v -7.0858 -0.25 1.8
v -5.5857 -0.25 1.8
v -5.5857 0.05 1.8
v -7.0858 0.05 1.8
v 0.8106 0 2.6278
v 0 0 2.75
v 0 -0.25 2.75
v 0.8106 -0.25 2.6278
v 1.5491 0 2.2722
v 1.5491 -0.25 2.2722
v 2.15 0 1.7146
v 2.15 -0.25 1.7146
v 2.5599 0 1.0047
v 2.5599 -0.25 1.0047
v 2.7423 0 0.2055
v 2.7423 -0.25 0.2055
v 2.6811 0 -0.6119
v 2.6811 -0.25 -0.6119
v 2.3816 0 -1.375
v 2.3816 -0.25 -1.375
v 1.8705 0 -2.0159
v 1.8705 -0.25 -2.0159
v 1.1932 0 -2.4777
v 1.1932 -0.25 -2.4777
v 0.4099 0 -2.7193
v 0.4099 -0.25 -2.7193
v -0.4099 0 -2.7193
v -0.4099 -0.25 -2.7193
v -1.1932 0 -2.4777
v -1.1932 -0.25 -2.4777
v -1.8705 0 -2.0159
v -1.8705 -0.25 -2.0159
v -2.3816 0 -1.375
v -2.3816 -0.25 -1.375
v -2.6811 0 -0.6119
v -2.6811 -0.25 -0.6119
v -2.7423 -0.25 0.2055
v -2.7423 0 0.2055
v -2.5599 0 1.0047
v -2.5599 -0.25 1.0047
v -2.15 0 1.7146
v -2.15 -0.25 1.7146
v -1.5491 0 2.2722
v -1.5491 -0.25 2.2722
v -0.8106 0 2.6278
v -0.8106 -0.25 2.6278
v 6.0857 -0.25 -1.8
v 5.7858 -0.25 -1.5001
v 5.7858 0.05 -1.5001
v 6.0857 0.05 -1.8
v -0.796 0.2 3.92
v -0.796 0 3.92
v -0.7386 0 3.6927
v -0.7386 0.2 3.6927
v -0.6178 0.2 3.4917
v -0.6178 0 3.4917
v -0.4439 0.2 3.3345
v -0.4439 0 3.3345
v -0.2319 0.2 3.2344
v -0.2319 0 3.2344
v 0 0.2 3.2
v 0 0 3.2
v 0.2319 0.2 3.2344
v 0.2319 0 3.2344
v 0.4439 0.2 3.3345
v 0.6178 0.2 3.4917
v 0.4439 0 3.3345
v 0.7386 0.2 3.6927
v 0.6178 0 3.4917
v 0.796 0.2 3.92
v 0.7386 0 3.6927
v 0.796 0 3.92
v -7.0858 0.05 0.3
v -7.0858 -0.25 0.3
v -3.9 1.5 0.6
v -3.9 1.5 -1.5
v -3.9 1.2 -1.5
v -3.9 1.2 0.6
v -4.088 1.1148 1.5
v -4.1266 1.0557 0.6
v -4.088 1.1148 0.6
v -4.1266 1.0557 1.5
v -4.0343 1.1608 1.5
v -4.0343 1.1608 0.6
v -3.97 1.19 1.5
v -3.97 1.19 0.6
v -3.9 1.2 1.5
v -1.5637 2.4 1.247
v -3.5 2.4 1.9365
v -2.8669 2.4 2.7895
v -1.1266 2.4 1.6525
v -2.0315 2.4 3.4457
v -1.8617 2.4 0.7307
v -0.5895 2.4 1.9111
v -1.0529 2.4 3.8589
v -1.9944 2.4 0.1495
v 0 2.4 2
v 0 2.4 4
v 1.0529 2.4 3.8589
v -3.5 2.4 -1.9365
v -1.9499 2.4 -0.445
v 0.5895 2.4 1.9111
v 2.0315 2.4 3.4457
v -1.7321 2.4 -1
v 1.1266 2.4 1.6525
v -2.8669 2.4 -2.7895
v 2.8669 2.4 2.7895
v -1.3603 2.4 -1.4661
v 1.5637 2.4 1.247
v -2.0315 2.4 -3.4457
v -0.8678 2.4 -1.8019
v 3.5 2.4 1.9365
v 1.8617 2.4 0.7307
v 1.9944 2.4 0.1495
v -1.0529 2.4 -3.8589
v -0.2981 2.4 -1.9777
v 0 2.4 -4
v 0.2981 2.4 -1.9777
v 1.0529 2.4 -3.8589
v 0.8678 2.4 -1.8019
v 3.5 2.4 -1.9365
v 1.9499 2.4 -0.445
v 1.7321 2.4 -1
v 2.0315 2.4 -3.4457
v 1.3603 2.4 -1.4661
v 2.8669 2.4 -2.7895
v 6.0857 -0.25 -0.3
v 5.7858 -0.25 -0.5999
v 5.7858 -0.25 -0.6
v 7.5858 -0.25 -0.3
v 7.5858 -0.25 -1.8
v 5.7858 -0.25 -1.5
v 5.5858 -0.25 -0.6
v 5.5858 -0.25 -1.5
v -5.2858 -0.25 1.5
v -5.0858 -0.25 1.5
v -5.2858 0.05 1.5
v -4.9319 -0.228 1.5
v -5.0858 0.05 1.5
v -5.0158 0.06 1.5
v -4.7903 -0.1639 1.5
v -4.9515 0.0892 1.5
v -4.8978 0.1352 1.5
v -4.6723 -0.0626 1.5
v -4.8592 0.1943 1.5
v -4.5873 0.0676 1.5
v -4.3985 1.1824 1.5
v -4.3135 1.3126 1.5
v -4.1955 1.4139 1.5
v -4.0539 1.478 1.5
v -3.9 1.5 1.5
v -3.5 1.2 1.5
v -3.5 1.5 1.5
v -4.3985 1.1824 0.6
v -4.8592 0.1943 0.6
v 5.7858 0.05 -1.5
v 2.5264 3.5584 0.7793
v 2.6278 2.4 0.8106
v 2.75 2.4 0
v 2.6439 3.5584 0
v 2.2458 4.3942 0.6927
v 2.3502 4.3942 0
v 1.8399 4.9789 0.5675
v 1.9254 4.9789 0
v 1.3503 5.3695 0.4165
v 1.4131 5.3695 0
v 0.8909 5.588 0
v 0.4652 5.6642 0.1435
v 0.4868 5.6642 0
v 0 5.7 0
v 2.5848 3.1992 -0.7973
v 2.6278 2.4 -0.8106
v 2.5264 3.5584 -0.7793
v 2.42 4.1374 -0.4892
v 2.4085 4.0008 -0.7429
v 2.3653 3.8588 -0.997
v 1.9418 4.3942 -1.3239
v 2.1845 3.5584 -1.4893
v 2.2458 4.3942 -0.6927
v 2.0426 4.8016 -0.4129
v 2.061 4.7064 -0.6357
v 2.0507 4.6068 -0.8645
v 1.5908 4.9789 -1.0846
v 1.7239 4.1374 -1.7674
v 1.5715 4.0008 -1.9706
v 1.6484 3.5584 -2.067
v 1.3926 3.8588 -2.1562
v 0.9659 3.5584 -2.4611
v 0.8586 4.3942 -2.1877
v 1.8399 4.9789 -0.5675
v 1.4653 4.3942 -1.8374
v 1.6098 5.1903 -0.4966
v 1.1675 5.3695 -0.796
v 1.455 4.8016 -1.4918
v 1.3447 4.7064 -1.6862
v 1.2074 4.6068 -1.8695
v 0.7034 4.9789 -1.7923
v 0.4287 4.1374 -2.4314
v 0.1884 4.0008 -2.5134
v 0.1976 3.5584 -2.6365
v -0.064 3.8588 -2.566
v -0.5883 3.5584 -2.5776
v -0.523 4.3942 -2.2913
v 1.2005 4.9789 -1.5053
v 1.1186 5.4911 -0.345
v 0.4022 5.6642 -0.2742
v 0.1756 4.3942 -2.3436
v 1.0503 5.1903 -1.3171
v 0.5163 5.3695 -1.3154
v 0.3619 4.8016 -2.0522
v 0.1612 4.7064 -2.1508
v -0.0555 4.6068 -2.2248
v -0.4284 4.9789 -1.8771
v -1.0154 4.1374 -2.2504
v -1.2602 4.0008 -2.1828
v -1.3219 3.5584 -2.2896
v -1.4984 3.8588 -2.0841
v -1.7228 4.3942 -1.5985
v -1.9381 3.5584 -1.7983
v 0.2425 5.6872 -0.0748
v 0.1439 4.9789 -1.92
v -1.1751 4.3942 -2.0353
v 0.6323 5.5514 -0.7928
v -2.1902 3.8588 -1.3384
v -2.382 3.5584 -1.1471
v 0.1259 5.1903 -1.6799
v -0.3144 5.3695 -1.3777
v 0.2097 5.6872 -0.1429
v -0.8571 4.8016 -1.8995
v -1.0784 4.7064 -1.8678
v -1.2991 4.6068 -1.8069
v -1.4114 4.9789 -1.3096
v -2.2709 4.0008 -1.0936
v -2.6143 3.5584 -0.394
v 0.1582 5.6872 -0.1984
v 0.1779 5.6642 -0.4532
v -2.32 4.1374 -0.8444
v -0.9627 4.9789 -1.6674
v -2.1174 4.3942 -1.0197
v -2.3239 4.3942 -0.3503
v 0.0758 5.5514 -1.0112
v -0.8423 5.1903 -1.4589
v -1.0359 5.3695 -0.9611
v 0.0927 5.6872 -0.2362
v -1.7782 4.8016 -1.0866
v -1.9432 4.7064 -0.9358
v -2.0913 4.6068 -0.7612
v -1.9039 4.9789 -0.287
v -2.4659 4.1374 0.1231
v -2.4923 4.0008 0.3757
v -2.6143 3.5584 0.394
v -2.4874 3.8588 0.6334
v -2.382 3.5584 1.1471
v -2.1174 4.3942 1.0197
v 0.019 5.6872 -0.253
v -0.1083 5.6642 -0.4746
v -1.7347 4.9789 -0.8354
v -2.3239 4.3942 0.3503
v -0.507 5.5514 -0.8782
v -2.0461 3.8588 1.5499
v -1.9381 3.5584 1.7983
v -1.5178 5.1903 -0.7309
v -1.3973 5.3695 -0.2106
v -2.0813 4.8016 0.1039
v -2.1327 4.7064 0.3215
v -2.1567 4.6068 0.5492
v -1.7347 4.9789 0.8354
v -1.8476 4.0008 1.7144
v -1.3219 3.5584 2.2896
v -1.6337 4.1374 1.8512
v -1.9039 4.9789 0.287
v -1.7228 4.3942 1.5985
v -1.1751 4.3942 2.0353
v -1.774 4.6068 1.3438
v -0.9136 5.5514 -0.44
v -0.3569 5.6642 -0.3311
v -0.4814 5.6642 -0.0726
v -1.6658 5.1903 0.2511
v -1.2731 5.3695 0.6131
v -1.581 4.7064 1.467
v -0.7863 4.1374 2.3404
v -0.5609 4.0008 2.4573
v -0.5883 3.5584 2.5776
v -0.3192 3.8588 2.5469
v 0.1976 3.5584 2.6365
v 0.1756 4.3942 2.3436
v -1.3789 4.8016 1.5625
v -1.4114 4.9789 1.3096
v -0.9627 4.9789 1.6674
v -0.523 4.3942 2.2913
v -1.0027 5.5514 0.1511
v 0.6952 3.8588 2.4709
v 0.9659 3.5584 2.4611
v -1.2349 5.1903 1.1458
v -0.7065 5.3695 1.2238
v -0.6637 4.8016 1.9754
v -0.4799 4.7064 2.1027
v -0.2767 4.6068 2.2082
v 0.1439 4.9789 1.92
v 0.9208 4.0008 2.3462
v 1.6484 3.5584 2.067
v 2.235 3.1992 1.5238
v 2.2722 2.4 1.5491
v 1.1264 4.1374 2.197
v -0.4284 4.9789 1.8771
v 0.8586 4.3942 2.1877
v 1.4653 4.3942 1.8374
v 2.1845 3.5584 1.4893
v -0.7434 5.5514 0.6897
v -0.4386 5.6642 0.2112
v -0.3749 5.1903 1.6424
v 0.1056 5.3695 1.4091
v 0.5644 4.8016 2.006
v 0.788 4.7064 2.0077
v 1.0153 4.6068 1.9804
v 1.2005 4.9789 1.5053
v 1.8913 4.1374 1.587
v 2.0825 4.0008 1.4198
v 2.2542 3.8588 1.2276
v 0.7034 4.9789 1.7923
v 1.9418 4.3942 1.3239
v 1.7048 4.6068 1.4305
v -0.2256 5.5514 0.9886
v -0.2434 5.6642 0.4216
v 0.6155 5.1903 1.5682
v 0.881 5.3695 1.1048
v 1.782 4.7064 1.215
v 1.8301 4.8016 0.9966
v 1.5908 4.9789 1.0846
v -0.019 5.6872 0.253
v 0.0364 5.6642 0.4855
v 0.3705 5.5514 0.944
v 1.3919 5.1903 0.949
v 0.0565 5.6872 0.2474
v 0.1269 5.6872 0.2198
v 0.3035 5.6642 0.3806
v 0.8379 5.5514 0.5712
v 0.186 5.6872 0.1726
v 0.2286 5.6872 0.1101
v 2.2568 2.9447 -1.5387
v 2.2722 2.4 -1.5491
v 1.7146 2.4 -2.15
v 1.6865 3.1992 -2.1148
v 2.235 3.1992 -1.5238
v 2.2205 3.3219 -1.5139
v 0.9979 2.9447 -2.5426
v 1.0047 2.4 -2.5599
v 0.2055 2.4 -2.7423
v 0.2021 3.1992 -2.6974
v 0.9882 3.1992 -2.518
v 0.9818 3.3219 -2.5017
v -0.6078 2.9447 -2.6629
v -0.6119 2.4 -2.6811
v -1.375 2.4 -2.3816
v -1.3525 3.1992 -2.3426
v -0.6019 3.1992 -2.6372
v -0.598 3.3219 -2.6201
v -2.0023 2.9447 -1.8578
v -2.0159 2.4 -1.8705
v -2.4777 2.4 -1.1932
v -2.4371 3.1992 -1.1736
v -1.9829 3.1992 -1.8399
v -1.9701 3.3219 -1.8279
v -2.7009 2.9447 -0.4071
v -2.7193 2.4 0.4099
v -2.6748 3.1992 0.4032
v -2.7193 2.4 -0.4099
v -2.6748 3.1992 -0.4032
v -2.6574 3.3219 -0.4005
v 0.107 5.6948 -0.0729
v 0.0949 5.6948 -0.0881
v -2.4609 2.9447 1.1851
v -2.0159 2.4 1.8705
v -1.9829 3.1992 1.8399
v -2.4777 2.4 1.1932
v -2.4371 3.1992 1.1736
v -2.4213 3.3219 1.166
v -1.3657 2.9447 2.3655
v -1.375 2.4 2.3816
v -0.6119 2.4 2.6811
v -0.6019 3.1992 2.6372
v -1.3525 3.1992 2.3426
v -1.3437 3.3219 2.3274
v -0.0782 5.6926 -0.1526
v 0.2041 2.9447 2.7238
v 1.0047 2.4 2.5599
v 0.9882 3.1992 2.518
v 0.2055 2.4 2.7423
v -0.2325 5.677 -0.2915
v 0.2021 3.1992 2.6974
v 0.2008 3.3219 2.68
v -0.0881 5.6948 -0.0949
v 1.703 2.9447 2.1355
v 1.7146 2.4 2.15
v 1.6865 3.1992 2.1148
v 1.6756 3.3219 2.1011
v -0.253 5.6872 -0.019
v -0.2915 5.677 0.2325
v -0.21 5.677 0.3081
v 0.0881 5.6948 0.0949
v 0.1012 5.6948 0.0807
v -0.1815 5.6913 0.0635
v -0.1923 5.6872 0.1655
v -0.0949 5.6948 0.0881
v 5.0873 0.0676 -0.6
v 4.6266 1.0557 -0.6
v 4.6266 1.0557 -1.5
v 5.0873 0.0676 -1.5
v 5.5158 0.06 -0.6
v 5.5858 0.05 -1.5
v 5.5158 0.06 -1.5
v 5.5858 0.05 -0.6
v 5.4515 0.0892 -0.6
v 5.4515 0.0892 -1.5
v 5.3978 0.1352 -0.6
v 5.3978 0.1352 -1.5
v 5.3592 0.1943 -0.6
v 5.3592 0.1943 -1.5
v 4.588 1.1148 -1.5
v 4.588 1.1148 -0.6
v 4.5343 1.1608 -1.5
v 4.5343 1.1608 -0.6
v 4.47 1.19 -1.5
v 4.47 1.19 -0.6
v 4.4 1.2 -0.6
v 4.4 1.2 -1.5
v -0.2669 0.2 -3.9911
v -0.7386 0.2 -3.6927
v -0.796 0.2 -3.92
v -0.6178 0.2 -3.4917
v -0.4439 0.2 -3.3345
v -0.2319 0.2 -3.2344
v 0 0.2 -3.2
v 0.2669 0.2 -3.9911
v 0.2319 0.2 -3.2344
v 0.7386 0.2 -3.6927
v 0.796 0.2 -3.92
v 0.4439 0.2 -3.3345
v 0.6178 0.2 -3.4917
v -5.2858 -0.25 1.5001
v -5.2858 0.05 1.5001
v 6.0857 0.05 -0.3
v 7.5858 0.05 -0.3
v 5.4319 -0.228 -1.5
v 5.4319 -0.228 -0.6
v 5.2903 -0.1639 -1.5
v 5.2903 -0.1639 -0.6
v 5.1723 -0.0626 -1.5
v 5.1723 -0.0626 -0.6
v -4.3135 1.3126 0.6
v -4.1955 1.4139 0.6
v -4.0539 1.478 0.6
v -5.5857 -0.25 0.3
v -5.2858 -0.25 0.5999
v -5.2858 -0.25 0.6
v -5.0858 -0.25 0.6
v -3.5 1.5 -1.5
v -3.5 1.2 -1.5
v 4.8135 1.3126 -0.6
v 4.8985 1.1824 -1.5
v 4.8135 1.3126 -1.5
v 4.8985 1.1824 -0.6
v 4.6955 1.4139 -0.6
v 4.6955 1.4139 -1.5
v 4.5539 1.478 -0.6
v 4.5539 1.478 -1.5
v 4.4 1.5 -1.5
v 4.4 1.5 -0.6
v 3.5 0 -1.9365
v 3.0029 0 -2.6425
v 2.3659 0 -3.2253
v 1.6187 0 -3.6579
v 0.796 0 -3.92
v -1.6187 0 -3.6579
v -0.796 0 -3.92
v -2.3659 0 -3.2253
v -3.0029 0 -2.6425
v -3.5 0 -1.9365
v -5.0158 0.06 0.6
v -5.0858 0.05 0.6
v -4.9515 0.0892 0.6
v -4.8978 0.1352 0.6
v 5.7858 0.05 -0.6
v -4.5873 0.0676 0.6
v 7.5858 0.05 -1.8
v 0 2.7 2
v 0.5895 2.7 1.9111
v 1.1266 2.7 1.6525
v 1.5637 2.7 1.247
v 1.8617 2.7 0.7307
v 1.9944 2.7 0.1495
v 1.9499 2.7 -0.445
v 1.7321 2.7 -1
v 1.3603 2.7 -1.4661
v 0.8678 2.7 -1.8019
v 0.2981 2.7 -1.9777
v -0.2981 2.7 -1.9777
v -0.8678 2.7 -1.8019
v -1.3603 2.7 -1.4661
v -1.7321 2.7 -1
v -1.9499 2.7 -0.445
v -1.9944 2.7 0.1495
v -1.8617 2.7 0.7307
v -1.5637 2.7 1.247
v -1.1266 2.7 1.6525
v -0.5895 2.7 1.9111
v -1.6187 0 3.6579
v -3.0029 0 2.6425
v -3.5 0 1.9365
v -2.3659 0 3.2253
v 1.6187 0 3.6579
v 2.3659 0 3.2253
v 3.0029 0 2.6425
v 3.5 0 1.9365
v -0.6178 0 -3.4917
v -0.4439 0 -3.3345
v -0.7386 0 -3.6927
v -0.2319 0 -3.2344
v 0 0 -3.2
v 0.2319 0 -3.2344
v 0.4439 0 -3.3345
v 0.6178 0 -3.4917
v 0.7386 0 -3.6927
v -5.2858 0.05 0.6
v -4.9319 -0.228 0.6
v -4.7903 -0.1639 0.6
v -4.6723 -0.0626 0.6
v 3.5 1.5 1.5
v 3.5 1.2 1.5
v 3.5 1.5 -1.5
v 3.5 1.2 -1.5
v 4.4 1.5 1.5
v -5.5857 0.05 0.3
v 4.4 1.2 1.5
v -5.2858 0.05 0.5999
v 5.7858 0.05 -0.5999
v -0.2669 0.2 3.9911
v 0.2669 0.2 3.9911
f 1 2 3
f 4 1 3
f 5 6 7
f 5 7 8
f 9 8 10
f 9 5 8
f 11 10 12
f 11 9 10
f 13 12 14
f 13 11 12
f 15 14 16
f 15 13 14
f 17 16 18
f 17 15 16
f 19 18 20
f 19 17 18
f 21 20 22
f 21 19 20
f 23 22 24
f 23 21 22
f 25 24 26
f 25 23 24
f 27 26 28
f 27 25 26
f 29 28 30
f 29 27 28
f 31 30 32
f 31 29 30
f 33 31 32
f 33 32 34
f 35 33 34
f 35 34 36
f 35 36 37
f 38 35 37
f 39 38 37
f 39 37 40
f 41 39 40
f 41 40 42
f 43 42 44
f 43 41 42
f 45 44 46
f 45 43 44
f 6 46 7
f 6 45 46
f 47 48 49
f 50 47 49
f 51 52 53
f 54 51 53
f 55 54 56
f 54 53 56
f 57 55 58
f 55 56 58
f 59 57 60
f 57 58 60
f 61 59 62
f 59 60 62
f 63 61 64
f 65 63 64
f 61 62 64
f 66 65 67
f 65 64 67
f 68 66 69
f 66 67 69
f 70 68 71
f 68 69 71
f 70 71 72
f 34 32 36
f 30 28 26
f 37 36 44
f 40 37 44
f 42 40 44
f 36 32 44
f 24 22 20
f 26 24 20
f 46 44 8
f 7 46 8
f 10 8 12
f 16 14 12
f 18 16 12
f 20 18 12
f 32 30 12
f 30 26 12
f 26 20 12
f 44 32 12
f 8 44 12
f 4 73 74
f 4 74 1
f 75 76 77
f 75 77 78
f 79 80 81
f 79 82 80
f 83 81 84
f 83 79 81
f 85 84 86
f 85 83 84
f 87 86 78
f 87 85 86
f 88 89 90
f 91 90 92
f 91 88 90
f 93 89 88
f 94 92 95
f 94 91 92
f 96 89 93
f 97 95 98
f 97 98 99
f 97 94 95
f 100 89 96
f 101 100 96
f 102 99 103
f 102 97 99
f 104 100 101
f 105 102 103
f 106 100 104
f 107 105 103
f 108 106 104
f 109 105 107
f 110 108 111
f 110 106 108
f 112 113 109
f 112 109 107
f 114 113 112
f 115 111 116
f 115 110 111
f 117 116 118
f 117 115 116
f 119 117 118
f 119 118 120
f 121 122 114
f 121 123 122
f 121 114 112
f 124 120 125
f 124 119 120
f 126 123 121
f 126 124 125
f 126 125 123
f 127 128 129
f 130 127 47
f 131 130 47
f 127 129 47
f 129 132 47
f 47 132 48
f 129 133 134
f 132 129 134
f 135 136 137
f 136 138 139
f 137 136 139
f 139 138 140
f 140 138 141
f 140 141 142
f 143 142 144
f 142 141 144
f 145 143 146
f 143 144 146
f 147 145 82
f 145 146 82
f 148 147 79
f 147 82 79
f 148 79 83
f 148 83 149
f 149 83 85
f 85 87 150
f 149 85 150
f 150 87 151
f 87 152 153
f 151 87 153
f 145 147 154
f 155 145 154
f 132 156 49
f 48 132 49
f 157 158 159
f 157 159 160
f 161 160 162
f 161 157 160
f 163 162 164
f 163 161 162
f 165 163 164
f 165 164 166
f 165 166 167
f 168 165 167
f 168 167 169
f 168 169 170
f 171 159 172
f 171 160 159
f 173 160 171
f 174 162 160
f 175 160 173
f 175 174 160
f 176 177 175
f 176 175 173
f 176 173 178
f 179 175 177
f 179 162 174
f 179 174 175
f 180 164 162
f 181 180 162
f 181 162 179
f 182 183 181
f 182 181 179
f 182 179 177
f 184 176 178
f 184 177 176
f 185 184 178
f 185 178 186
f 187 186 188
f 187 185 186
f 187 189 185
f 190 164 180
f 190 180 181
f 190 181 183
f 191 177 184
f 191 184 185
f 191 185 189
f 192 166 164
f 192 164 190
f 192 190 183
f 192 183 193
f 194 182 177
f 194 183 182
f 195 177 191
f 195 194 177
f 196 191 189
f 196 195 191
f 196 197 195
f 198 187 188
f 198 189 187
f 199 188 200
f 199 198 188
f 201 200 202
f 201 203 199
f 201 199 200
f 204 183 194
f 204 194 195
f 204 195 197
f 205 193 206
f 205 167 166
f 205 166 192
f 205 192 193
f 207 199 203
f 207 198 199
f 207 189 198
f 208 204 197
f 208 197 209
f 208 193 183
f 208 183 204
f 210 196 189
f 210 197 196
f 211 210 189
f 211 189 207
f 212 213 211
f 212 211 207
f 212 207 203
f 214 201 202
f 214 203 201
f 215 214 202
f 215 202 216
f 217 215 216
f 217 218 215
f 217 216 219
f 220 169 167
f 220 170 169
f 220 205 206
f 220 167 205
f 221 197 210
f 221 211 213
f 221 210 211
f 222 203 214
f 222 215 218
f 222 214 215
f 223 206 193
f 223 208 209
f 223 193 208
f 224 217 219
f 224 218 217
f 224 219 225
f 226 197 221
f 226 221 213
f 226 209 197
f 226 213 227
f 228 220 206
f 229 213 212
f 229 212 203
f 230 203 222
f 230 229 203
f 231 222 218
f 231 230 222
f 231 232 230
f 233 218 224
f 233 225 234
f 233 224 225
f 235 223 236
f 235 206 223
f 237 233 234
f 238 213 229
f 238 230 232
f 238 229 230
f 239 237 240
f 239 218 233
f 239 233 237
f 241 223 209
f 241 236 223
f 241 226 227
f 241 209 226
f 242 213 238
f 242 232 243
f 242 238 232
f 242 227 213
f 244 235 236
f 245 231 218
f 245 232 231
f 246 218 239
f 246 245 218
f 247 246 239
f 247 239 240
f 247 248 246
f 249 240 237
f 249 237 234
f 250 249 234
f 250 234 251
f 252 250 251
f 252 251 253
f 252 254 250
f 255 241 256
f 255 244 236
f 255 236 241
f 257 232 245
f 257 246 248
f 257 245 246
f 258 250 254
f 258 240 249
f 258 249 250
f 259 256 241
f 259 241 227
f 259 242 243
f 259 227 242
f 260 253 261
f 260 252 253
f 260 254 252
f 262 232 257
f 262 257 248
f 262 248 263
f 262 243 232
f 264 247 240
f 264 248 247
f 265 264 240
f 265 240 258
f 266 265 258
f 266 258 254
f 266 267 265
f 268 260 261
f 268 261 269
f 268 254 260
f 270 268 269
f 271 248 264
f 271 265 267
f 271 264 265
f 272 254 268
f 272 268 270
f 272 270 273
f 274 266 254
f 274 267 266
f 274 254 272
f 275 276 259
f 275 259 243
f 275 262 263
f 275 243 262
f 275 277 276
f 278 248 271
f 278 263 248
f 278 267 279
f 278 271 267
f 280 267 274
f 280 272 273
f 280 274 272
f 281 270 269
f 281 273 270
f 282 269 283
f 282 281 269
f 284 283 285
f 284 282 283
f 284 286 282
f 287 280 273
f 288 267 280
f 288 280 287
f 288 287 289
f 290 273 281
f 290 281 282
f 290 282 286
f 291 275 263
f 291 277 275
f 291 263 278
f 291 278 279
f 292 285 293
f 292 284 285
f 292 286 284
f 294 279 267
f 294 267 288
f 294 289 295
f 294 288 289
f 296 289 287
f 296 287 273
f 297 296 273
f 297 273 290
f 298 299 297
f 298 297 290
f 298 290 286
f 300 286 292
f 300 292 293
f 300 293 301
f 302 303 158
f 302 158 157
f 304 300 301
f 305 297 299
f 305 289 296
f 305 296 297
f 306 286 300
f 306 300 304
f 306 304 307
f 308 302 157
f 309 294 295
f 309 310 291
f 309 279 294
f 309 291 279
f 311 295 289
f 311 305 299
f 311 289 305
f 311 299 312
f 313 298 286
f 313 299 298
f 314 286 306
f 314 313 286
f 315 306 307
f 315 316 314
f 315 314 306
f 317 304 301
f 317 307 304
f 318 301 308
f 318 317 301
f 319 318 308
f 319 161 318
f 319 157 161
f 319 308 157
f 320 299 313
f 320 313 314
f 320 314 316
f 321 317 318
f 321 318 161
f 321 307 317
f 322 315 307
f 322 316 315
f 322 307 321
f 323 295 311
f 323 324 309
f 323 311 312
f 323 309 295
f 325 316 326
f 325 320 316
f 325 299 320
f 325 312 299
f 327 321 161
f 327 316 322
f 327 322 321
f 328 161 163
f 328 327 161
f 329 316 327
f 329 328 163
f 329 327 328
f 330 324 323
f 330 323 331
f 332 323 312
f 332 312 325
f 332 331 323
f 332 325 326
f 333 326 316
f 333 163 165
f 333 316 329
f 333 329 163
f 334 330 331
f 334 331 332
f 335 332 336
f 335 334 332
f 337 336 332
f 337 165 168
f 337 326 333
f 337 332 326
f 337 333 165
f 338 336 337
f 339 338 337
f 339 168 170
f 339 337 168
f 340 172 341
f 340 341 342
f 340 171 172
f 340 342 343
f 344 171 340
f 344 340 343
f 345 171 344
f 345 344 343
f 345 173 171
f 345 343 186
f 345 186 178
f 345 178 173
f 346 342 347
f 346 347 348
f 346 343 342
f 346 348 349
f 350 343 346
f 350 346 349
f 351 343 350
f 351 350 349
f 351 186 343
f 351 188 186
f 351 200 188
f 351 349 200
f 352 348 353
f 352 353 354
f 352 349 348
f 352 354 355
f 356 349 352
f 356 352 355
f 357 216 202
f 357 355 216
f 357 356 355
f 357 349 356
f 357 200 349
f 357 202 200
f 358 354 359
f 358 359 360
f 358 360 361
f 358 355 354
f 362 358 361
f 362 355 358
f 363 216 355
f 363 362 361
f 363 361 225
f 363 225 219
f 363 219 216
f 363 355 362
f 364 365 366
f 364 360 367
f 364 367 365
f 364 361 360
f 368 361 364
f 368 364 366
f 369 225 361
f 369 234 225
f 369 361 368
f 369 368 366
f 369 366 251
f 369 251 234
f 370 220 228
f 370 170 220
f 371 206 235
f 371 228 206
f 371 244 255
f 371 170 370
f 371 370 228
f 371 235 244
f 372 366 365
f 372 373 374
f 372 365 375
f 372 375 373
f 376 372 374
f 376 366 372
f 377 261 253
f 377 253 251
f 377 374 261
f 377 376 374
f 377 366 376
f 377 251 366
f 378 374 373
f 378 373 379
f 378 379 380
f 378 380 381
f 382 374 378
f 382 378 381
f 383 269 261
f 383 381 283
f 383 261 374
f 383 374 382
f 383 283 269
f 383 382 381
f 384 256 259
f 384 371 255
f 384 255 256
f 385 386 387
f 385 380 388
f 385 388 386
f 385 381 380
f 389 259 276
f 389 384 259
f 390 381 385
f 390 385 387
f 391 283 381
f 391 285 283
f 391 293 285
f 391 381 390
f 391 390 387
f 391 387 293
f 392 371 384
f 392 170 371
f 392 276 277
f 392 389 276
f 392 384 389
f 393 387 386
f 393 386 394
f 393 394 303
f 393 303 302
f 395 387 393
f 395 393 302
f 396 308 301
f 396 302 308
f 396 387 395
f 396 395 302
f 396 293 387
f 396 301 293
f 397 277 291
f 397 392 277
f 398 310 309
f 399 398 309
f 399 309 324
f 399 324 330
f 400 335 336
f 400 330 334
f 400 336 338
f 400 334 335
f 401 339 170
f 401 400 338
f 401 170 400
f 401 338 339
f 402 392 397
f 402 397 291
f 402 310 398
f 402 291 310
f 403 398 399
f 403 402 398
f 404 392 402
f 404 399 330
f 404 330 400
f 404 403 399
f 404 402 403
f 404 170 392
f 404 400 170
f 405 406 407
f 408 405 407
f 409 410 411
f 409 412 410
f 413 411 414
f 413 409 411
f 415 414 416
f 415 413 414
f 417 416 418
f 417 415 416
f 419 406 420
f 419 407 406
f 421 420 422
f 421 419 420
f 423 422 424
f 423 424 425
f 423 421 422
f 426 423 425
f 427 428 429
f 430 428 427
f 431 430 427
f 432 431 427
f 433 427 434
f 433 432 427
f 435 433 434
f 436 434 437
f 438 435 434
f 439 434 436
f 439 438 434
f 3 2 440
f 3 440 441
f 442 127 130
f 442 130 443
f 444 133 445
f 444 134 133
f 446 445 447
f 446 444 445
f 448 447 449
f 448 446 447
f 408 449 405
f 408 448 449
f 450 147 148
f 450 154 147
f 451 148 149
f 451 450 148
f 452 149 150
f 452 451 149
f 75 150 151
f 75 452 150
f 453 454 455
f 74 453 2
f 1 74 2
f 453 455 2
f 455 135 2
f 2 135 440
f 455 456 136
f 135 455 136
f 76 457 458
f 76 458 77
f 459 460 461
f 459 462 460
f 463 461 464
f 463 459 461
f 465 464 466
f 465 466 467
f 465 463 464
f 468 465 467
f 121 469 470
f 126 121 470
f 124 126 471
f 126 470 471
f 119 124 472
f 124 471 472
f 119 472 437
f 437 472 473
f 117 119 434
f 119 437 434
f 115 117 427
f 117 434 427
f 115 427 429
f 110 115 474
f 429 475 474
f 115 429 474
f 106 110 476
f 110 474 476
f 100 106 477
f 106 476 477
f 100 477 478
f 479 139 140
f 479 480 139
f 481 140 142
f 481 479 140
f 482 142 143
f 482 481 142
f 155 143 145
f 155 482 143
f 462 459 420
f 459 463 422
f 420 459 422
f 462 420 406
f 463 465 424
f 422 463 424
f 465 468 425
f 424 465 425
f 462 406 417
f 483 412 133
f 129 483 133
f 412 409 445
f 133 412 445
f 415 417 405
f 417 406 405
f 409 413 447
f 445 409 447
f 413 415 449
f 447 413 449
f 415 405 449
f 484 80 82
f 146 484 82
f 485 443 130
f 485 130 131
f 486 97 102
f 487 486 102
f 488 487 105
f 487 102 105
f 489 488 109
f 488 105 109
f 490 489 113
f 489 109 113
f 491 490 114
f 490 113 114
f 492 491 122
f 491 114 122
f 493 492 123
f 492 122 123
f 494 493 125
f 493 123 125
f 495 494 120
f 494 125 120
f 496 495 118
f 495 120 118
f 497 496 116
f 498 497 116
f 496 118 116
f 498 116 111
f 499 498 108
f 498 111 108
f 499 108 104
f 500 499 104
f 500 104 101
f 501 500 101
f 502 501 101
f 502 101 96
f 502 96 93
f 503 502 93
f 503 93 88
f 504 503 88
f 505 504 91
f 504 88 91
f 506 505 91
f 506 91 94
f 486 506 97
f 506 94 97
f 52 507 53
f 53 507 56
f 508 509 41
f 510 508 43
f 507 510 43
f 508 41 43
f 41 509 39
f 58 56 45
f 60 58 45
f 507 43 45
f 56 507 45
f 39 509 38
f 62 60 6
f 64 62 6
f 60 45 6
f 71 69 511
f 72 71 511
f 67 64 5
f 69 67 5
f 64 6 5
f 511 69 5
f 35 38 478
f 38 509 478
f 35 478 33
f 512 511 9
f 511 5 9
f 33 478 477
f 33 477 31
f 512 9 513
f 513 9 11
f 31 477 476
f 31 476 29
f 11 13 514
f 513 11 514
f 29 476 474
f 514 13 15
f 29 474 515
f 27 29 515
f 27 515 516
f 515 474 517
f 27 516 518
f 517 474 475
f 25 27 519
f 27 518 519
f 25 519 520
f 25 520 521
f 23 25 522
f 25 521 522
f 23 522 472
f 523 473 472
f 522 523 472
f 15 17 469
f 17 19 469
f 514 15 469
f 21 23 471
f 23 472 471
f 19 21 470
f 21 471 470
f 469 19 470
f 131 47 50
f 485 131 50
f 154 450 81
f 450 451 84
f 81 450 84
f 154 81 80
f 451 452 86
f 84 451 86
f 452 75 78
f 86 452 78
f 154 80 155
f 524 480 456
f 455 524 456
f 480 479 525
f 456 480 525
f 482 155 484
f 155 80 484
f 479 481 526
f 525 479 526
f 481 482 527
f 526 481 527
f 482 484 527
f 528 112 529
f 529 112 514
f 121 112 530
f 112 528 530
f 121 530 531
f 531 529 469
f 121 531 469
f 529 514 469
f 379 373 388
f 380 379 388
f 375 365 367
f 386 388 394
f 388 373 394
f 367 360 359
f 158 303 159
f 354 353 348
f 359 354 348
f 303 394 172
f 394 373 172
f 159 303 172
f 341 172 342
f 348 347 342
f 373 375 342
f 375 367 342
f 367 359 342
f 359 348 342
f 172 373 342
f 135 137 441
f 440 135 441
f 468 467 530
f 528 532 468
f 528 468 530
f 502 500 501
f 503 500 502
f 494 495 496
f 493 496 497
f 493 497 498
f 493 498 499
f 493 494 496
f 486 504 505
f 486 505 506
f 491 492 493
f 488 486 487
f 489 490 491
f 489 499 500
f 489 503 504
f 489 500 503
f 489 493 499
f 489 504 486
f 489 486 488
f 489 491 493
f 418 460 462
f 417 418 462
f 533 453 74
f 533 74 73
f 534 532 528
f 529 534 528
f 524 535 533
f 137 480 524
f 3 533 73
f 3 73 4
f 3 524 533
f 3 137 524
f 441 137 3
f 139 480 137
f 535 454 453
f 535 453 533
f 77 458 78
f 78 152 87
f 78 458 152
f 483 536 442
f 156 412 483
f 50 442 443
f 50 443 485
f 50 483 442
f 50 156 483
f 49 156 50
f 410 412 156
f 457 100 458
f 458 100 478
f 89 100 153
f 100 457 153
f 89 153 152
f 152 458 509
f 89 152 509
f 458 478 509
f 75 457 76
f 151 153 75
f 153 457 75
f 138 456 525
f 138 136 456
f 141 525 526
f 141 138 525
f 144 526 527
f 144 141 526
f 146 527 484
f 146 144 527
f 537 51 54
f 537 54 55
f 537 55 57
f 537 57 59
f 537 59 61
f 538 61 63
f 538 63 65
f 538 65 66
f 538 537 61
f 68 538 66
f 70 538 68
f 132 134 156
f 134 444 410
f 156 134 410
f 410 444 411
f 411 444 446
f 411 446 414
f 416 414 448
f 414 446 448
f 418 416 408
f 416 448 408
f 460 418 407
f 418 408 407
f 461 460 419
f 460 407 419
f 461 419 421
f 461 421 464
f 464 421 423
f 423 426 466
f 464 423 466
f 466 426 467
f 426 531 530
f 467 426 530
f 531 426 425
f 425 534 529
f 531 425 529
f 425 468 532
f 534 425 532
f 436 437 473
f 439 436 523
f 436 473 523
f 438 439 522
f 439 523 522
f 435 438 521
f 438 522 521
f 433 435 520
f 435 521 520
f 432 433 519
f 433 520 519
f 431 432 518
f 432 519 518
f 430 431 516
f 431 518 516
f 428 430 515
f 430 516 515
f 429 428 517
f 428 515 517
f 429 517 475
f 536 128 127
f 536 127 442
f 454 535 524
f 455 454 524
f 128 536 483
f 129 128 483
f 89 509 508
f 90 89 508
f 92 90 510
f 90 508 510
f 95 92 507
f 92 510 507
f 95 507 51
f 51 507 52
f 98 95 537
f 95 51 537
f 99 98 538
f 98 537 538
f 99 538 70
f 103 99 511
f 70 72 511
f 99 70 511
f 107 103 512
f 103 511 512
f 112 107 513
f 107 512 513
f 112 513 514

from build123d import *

# Parameters (mm, degrees)
BOSS_EXTRUDE1_DEPTH = 2.4
SKETCH2_R           = 2.75
BOSS_EXTRUDE2_DEPTH = 0.25
SKETCH3_R           = 2
BOSS_EXTRUDE3_DEPTH = 0.3
SKETCH5_W           = 8.3
SKETCH5_H           = 3
BOSS_EXTRUDE4_DEPTH = 0.15
SKETCH6_W           = 0.9
SKETCH6_H           = 0.3
SKETCH8_W           = 0.9
SKETCH8_H           = 0.3
SKETCH10_W          = 1.5
SKETCH10_H          = 0.3
BOSS_EXTRUDE5_DEPTH = 1.8
SKETCH11_W          = 1.5
SKETCH11_H          = 0.3
BOSS_EXTRUDE6_DEPTH = 1.8
CHAMFER1_SIZE       = 0.3
SKETCH12_R          = 0.8
CUT_EXTRUDE1_DEPTH  = 0.2


with BuildPart() as part:
    # Sketch1 → Boss-Extrude1 (new body)
    with BuildSketch(Plane(origin=(0, 0, 0), x_dir=(1, 0, 0), z_dir=(0, 1, 0))):
        with BuildLine():
            Line((-3.5, 1.936491673), (-3.5, -1.936491673))
            ThreePointArc((-3.5, -1.936491673), (0, -4), (3.5, -1.936491673))
            Line((3.5, -1.936491673), (3.5, 1.936491673))
            ThreePointArc((3.5, 1.936491673), (0, 4), (-3.5, 1.936491673))
        make_face()
    extrude(amount=BOSS_EXTRUDE1_DEPTH)

    # Sketch2 → Boss-Extrude2 (add)
    with BuildSketch(Plane(origin=(0, 0, 0), x_dir=(1, 0, 0), z_dir=(0, 1, 0))):
        with Locations(Location((0, 0, 0), (0, 0, 270))):
            Circle(SKETCH2_R)
    extrude(amount=-BOSS_EXTRUDE2_DEPTH)

    # Sketch3 → Boss-Extrude3 (add)
    with BuildSketch(Plane(origin=(0, 2.4, 0), x_dir=(1, 0, 0), z_dir=(0, 1, 0))):
        with Locations(Location((0, 0, 0), (0, 0, 270))):
            Circle(SKETCH3_R)
    extrude(amount=BOSS_EXTRUDE3_DEPTH)

    # Sketch5 → Boss-Extrude4 (add, symmetric)
    with BuildSketch(Plane(origin=(0, 1.35, 0), x_dir=(-1, 0, 0), z_dir=(0, 1, 0))):
        with Locations((-0.25, 0)):
            Rectangle(SKETCH5_W, SKETCH5_H)
    extrude(amount=BOSS_EXTRUDE4_DEPTH, both=True)

    # Sweep2: sweep along a path in Sketch7
    with BuildLine(Plane.XY.offset(-1.05)) as sweep2_path:
        Line((5.785802313, -0.1), (5.585802313, -0.1))
        ThreePointArc((5.585802313, -0.1), (5.37088247, -0.037356578), (5.223279198, 0.130952695))
        Line((5.223279198, 0.130952695), (4.762523115, 1.119047305))
        ThreePointArc((4.762523115, 1.119047305), (4.614919843, 1.287356578), (4.4, 1.35))
    # Sketch6 → Sweep2 (sweep)
    with BuildSketch(Plane(origin=(4.4, 0, 0), x_dir=(0, 0, -1), z_dir=(1, 0, 0))):
        with Locations((1.05, 1.35)):
            Rectangle(SKETCH6_W, SKETCH6_H)
    sweep(path=sweep2_path.line)

    # Sweep3: sweep along a path in Sketch9
    with BuildLine(Plane.XY.offset(1.05)) as sweep3_path:
        Line((-5.285802313, -0.1), (-5.085802313, -0.1))
        ThreePointArc((-5.085802313, -0.1), (-4.87088247, -0.037356578), (-4.723279198, 0.130952695))
        Line((-4.723279198, 0.130952695), (-4.262523115, 1.119047305))
        ThreePointArc((-4.262523115, 1.119047305), (-4.114919843, 1.287356578), (-3.9, 1.35))
    # Sketch8 → Sweep3 (sweep)
    with BuildSketch(Plane.ZY.offset(3.9)):
        with Locations((1.05, 1.35)):
            Rectangle(SKETCH8_W, SKETCH8_H)
    sweep(path=sweep3_path.line)

    # Sketch10 → Boss-Extrude5 (add)
    with BuildSketch(Plane.ZY.offset(5.285802313)):
        with Locations((1.05, -0.1)):
            Rectangle(SKETCH10_W, SKETCH10_H)
    extrude(amount=BOSS_EXTRUDE5_DEPTH)

    # Sketch11 → Boss-Extrude6 (add)
    with BuildSketch(Plane(origin=(5.785802313, 0, 0), x_dir=(0, 0, -1), z_dir=(1, 0, 0))):
        with Locations((1.05, -0.1)):
            Rectangle(SKETCH11_W, SKETCH11_H)
    extrude(amount=BOSS_EXTRUDE6_DEPTH)

    # Chamfer1
    chamfer1_edges = [part.edges().sort_by_distance(p)[0] for p in [
        (5.785802313, -0.1, -0.3),
        (5.785802313, -0.1, -1.8),
        (-5.285802313, -0.1, 0.3),
        (-5.285802313, -0.1, 1.8),
    ]]
    chamfer(chamfer1_edges, length=CHAMFER1_SIZE - 0.0001)  # a hair under: the kernel refuses the full size

    # Sketch12 → Cut-Extrude1 (cut)
    with BuildSketch(Plane.XZ):
        with Locations((0, 4)):
            Circle(SKETCH12_R)
        with Locations((0, -4)):
            Circle(SKETCH12_R)
    extrude(amount=-CUT_EXTRUDE1_DEPTH, mode=Mode.SUBTRACT)


with BuildPart() as body_2:
    # Sketch4 → Revolve1 (revolve)
    with BuildSketch(Plane.XY):
        with BuildLine():
            Line((0, 2.4), (0, 5.7))
            add(Edge.make_bspline(
                [(2.75, 2.4), (2.768262319, 4.804056581), (0.735398067, 5.678302049), (0, 5.7)],
                knots=[0, 0, 0, 0.79605036, 1, 1, 1], degree=2))
            Line((2.75, 2.4), (0, 2.4))
        make_face()
    revolve(axis=Axis((0, 2.4, 0), (0, 1, 0)))


solid = Compound([part.part, body_2.part])
